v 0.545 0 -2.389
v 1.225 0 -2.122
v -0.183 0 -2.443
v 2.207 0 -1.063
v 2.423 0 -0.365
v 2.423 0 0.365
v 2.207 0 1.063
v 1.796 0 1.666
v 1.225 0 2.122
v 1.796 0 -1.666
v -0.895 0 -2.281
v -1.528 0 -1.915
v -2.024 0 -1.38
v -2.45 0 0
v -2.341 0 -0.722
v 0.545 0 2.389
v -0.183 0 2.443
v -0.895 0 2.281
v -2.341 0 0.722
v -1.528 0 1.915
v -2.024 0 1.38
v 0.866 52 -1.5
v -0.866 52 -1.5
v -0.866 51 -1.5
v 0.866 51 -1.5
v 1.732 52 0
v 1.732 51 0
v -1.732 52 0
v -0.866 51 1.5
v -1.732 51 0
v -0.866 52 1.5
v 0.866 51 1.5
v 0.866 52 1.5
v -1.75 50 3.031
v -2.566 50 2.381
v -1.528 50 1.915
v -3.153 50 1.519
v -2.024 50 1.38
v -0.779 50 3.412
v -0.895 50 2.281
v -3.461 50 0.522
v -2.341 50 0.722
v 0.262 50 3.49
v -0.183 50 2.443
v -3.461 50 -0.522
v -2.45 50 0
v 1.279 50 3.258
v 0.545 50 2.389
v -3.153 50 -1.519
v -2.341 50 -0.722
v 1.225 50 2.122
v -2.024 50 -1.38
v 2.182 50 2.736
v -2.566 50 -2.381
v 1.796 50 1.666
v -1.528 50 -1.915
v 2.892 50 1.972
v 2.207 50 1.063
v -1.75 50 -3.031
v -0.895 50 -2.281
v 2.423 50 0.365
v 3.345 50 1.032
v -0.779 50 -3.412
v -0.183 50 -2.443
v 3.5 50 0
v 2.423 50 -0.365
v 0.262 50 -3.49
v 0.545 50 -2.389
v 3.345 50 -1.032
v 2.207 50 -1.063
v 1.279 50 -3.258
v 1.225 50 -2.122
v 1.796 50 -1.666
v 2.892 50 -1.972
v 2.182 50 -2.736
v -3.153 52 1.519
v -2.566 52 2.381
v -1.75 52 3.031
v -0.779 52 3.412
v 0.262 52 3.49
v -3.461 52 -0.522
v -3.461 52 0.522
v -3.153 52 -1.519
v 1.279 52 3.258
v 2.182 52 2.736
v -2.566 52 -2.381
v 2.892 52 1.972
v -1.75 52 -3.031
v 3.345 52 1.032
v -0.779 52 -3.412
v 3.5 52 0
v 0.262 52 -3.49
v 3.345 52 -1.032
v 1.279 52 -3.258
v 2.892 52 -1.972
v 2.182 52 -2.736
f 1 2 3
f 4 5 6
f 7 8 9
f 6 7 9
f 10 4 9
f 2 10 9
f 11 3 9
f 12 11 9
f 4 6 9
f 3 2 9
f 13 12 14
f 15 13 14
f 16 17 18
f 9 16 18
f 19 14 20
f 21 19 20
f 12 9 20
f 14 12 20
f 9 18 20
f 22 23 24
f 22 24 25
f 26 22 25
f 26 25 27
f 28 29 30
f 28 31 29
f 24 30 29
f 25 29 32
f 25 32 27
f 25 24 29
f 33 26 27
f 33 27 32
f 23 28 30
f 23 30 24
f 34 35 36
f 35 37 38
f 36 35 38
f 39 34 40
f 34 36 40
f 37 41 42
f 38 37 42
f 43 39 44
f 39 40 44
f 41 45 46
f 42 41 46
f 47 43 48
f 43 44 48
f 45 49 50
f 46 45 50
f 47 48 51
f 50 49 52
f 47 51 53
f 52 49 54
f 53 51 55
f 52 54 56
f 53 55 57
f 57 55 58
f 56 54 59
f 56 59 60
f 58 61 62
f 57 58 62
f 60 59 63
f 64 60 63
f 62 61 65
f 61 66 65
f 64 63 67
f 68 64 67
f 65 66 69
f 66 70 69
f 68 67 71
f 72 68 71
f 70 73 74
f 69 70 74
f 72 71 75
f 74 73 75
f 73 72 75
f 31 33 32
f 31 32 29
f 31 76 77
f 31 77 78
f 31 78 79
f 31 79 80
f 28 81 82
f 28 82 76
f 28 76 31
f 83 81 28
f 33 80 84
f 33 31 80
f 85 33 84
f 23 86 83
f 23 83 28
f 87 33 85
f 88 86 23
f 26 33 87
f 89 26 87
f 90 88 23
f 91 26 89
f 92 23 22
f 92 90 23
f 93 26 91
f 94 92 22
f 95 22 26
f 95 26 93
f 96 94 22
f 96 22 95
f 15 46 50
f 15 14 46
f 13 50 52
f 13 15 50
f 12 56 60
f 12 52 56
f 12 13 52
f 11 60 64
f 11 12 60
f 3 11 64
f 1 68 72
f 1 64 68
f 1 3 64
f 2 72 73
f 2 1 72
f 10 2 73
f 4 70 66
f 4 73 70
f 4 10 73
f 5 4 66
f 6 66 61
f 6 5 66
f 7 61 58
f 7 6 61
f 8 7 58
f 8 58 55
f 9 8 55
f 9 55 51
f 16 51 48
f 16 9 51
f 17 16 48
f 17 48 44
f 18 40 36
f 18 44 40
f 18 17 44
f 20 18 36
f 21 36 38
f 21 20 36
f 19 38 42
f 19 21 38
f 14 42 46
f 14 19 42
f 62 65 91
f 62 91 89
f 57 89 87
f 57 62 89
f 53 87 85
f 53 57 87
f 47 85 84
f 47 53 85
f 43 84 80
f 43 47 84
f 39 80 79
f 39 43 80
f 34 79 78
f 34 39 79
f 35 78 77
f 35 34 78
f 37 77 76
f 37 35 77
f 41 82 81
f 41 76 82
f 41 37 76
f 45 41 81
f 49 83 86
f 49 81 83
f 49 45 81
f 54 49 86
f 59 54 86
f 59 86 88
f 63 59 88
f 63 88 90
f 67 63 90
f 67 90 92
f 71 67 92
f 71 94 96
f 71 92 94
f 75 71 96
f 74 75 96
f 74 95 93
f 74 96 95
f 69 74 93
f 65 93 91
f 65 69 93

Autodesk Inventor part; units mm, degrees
ref_plane "YZ Plane" through (0, 0, 0) normal (1, 0, 0) x (0, 1, 0)
ref_plane "XZ Plane" through (0, 0, 0) normal (0, 1, 0) x (-1, 0, 0)
ref_plane "XY Plane" through (0, 0, 0) normal (0, 0, 1) x (1, 0, 0)
sketch "Sketch1" plane through (0, 0, 0) normal (0, 1, 0) x (-1, 0, 0)
  circle A0 centre (0, 0) radius 2.45
  dimension "d0" = 4.9
extrude "Extrusion1" add sketch "Sketch1" along normal blind 50
sketch "Sketch2" plane through (0, 50, 0) normal (0, 1, 0) x (1, 0, 0)
  circle A0 centre (0, 0) radius 3.5
  dimension "d3" = 7
extrude "Extrusion2" add sketch "Sketch2" along normal blind 2
thread "Thread1" size "M5x0.8" class "6g" standard "ANSI Metric M Profile" full length
sketch "Sketch3" plane through (0, 52, 0) normal (0, 1, 0) x (1, 0, 0)
  line L0 (0.866, 1.5) -> (1.7321, 0)
  line L1 (1.7321, 0) -> (0.866, -1.5)
  line L2 (0.866, -1.5) -> (-0.866, -1.5)
  line L3 (-0.866, -1.5) -> (-1.7321, 0)
  line L4 (-1.7321, 0) -> (-0.866, 1.5)
  line L5 (-0.866, 1.5) -> (0.866, 1.5)
  point P0 (0, 0)
  point P1 (0, 0)
  dimension "d8" = 3
extrude "Extrusion3" cut sketch "Sketch3" against normal blind 1
equation "\"BendRadius\" = Thickness"
equation "\"BendReliefWidth\" = Thickness"
equation "\"BendReliefDepth\" = 0.5 * Thickness"
equation "\"CornerReliefSize\" = 4 * Thickness"
equation "\"MinimumRemnant\" = 2 * Thickness"
equation "\"TransitionRadius\" = BendRadius"
equation "\"JacobiRadiusSize\" = BendRadius"
equation "\"GapSize\" = Thickness"
equation "\"Thickness\" = 0.5"
properties part number "perno_simple"
